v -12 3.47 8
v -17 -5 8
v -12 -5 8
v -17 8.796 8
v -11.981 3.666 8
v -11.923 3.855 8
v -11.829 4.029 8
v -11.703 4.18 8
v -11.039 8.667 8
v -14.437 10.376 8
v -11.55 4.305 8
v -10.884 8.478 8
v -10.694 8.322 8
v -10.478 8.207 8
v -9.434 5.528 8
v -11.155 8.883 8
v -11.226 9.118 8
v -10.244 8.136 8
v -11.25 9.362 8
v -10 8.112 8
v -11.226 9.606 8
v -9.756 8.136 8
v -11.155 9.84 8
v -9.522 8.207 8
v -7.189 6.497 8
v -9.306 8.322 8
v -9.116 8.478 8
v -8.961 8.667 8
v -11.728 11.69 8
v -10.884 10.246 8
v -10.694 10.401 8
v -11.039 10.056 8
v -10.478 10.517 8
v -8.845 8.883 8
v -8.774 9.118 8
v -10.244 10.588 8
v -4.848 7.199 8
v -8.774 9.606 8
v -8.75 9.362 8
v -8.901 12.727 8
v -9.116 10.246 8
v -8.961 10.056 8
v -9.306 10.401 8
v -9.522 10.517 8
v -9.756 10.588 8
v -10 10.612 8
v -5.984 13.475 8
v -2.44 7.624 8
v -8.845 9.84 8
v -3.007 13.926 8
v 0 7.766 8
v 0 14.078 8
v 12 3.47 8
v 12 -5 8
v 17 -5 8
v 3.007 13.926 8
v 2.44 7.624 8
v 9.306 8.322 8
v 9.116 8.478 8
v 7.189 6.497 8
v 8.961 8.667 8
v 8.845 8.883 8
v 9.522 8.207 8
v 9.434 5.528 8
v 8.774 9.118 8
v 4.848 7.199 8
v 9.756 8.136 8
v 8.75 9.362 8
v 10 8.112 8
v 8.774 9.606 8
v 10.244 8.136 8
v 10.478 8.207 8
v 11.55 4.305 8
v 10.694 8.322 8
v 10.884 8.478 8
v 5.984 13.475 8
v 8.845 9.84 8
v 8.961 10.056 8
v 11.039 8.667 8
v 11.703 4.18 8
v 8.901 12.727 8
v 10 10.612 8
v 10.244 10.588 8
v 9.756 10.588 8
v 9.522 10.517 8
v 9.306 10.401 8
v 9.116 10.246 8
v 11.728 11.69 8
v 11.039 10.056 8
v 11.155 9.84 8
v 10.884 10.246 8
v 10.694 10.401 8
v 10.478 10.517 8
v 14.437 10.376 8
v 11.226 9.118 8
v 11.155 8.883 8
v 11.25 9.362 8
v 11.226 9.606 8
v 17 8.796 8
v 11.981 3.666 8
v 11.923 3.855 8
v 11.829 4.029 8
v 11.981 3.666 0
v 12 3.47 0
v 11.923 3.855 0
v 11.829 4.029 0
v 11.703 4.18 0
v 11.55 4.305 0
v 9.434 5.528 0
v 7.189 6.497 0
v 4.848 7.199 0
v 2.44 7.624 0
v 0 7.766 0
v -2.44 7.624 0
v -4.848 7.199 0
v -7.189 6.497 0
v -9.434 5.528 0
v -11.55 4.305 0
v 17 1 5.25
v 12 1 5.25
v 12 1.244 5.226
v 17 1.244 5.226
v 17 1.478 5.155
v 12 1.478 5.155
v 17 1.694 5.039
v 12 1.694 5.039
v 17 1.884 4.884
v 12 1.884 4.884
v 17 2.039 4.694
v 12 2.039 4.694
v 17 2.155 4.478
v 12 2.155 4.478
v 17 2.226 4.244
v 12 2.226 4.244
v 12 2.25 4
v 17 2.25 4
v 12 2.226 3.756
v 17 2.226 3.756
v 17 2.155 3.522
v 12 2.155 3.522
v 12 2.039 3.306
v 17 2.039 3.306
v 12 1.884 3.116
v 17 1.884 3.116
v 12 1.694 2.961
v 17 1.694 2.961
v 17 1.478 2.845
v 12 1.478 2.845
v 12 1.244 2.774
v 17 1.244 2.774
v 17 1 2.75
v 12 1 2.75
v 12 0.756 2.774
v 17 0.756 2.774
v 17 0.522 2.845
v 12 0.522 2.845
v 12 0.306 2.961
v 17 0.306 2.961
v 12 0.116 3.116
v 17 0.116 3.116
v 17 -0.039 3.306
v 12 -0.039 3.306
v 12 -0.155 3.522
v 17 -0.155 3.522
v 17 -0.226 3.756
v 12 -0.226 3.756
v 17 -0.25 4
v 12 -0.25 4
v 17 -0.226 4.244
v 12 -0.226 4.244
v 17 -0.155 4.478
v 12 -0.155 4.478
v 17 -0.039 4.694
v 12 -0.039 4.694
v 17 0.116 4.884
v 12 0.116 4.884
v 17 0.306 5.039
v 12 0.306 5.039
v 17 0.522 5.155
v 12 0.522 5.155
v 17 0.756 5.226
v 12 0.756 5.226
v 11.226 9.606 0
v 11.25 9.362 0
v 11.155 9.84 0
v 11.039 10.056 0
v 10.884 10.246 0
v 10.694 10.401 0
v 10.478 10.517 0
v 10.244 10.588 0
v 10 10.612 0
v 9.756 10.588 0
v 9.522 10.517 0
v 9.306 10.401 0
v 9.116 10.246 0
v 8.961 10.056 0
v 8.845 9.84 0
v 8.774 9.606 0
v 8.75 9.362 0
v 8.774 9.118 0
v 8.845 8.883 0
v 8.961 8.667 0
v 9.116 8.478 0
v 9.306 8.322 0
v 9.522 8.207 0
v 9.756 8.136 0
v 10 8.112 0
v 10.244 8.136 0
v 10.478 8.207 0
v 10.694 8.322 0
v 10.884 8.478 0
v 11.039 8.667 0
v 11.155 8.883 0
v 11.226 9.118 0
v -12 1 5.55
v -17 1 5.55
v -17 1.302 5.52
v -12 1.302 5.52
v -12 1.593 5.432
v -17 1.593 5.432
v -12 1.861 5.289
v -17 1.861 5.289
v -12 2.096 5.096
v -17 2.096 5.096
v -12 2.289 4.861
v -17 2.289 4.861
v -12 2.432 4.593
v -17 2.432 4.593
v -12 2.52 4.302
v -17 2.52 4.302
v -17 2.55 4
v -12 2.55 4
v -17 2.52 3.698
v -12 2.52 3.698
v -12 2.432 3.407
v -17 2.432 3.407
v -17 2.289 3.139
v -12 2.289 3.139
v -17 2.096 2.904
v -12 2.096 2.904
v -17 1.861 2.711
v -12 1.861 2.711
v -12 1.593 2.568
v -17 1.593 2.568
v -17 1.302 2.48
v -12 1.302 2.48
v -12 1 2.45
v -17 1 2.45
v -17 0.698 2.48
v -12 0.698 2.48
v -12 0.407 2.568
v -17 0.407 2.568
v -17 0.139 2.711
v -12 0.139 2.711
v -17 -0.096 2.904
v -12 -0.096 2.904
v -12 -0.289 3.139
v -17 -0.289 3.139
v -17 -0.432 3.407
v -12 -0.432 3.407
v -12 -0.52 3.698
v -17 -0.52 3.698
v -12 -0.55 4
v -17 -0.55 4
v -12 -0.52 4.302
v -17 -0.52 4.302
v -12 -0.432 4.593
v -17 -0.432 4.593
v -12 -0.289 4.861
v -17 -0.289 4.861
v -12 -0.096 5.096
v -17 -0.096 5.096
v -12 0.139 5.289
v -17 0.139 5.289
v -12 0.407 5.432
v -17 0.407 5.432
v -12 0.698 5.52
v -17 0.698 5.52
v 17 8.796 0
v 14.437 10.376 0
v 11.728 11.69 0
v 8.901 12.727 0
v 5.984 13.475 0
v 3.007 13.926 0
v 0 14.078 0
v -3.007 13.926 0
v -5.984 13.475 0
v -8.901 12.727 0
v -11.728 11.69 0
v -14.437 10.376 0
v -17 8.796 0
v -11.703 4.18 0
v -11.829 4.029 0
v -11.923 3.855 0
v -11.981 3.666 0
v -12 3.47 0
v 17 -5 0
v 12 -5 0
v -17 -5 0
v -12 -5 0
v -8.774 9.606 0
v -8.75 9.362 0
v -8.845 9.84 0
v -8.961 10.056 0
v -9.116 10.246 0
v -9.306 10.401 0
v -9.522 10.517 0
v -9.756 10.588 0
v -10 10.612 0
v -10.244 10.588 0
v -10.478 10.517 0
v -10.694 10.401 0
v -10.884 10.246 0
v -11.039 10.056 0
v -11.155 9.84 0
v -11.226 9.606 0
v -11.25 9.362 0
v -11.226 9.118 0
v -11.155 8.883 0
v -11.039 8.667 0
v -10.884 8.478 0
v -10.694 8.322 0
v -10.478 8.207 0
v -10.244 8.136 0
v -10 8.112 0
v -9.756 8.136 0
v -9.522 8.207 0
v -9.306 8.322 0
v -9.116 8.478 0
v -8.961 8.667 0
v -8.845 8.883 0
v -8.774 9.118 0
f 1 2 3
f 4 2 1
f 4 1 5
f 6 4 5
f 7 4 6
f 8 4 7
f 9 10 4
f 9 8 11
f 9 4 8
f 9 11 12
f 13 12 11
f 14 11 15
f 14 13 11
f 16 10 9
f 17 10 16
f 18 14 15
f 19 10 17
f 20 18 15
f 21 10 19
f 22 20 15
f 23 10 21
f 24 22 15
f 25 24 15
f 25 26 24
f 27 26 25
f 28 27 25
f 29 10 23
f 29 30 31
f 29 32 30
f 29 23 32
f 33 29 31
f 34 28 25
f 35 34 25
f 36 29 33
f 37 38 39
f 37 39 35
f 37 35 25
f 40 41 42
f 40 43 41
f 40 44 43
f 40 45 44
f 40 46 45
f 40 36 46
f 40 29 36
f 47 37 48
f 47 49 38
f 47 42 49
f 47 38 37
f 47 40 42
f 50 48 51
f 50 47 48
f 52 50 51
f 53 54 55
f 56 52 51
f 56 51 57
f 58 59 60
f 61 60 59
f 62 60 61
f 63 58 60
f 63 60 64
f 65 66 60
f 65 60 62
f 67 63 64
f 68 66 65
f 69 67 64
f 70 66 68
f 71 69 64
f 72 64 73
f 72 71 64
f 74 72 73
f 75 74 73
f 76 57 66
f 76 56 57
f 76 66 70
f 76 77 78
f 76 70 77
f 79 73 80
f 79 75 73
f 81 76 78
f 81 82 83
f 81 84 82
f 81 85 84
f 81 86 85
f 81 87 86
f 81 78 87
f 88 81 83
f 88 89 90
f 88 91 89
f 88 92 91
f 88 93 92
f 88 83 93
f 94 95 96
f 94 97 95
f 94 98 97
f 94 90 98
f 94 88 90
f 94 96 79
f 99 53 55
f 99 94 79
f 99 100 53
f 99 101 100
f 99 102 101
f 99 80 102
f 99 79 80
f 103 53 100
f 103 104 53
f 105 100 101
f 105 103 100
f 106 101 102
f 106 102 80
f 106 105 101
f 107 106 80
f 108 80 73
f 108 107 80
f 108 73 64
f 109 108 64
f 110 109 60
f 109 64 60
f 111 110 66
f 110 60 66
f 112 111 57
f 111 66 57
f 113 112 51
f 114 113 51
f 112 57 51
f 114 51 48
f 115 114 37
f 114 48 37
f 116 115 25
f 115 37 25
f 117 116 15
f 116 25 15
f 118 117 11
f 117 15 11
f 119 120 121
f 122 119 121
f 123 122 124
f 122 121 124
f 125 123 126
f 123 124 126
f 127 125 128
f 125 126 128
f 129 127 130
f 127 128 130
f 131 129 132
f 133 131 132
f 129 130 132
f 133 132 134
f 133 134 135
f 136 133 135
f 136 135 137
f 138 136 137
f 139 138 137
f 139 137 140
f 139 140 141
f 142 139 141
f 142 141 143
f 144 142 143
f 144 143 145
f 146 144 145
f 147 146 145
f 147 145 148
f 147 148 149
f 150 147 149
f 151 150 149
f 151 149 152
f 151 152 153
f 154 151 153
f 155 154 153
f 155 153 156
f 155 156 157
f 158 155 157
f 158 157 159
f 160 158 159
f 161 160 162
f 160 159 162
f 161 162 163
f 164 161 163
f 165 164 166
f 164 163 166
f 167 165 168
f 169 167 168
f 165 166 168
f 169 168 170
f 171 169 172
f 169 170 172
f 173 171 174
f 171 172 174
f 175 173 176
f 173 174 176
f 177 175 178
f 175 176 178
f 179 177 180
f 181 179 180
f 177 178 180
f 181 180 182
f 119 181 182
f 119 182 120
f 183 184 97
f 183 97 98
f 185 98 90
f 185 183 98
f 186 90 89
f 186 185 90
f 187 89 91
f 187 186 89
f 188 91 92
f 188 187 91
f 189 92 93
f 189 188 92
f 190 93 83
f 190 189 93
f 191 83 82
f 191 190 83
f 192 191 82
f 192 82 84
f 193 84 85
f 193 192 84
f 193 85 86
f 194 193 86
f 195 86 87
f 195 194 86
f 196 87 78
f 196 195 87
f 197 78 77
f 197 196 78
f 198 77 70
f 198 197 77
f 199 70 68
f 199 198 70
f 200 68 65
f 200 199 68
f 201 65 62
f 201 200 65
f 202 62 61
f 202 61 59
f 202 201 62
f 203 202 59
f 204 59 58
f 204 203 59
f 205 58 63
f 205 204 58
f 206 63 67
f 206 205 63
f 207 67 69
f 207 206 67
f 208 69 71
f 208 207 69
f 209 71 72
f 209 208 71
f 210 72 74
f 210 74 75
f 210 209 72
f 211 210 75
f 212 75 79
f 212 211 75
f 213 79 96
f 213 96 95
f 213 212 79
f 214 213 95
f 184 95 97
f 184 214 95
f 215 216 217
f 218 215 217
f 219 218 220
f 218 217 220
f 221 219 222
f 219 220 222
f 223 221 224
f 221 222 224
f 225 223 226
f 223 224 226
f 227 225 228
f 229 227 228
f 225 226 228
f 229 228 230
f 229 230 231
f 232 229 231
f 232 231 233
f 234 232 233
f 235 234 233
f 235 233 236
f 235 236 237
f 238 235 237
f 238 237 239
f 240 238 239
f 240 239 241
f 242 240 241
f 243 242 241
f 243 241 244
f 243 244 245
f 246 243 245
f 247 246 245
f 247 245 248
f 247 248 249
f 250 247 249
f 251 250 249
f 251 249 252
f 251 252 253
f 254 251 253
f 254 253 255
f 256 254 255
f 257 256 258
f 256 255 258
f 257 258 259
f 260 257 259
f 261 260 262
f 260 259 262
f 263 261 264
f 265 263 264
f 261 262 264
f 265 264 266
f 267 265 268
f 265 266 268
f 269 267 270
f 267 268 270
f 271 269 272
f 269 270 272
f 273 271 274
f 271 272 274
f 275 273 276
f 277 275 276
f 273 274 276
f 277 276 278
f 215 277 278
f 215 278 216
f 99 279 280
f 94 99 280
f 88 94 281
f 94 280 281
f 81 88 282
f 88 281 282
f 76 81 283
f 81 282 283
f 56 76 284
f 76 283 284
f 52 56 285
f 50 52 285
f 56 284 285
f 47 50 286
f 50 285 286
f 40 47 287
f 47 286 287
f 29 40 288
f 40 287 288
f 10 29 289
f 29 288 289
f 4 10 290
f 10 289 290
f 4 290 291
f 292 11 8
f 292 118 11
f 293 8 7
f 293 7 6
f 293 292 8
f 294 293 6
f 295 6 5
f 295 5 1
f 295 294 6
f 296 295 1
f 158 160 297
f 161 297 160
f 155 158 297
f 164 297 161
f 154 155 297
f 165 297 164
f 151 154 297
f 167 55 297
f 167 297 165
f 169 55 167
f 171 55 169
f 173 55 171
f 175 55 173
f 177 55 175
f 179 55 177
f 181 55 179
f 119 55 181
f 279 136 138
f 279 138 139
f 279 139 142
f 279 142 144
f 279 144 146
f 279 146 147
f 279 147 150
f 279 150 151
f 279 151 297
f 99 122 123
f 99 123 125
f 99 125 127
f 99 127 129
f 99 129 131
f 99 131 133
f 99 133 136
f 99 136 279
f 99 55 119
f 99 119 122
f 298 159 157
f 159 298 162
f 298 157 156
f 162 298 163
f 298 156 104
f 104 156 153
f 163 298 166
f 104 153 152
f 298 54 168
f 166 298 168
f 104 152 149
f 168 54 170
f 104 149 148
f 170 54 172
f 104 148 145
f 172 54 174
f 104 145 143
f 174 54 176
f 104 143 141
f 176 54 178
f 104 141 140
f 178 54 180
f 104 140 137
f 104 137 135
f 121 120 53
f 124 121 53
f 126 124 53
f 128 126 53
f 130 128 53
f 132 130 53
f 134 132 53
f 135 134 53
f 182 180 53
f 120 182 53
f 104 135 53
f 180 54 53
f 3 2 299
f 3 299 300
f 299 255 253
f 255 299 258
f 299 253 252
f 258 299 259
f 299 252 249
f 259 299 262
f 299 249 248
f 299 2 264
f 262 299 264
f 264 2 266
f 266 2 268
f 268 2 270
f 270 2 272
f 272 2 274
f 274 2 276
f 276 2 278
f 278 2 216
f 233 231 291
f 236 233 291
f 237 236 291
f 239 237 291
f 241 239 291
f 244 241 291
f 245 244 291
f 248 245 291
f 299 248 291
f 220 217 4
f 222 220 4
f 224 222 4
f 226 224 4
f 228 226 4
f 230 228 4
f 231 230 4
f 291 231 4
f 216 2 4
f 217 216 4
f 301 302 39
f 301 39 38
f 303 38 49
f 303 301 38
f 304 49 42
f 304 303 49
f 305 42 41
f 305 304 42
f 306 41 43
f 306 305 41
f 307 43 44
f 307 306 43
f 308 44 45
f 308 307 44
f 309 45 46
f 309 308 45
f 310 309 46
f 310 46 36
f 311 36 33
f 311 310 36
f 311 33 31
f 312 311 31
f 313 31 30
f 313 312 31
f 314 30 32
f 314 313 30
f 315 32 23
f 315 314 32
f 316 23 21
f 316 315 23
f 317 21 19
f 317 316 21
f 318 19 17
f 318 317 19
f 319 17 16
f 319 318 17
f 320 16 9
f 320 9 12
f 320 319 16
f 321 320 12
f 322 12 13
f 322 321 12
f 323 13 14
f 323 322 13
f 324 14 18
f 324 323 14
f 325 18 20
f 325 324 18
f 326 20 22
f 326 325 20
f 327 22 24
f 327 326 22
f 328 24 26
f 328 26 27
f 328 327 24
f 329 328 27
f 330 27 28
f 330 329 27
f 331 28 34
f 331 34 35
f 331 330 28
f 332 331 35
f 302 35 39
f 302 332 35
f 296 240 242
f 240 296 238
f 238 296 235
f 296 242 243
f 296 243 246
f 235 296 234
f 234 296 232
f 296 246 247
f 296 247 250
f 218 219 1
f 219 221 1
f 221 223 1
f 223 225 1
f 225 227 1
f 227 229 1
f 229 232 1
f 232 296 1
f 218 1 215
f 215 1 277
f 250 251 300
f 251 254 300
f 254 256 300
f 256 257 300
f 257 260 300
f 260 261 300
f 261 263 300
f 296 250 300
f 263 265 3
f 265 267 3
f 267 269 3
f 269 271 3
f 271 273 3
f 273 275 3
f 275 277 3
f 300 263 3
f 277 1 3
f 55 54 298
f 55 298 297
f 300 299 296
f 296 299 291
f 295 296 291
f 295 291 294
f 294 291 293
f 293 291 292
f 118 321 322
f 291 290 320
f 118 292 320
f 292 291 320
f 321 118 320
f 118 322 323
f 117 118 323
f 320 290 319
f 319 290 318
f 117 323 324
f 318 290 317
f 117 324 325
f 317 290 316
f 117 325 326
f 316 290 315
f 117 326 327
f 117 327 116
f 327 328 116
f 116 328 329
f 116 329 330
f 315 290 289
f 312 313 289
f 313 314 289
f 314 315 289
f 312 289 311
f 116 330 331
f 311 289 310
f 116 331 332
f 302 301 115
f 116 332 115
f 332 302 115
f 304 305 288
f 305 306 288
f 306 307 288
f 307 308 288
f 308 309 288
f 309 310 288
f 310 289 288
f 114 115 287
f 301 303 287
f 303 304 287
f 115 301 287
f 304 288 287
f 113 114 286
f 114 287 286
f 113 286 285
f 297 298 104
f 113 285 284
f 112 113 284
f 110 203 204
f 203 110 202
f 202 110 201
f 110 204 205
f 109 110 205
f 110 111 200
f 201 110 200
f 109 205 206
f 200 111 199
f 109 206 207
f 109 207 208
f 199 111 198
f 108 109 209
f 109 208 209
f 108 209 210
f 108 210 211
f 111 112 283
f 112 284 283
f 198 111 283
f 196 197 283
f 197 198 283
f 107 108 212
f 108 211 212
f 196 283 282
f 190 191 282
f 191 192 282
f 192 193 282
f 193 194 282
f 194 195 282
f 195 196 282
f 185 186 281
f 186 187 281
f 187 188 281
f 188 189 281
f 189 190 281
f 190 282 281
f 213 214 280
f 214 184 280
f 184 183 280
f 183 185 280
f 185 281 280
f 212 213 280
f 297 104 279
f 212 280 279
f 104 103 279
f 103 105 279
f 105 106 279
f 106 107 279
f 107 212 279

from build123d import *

# Parameters (mm, degrees)
SKETCH_4_R          = 1.25
EXTRUDE_2_DEPTH     = 8
SKETCH_5_W          = 4.5
SKETCH_5_H          = 18.121653049
CUT_EXTRUDE_2_DEPTH = 9
SKETCH_6_R          = 1.25
CUT_EXTRUDE_3_DEPTH = 35
SKETCH_7_R          = 1.55
CUT_EXTRUDE_4_DEPTH = 6
FILLET_1_R          = 1


with BuildPart() as part:
    # 草图4 → 凸台-拉伸2 (new body)
    with BuildSketch(Plane.XY):
        with BuildLine():
            Line((-21.5, 5), (-21.5, -5))
            Line((-21.5, -5), (21.5, -5))
            Line((21.5, -5), (21.5, 5))
            ThreePointArc((21.5, 5), (0, 14.077524047), (-21.5, 5))
        make_face()
        with Locations((-10, 9.361795295)):
            Circle(SKETCH_4_R, mode=Mode.SUBTRACT)
        with Locations((10, 9.361795295)):
            Circle(SKETCH_4_R, mode=Mode.SUBTRACT)
    extrude(amount=EXTRUDE_2_DEPTH)

    # 草图5 → 切除-拉伸2 (cut, through all)
    with BuildSketch(Plane.XY.offset(8)):
        with BuildLine():
            Line((-12, 4), (-12, -5))
            Line((-12, -5), (12, -5))
            Line((12, -5), (12, 4))
            ThreePointArc((12, 4), (0, 7.76631206), (-12, 4))
        make_face()
        with Locations((19.25, 4.060826525)):
            Rectangle(SKETCH_5_W, SKETCH_5_H)
        with Locations((-19.25, 4.060826525)):
            Rectangle(SKETCH_5_W, SKETCH_5_H)
    extrude(amount=-CUT_EXTRUDE_2_DEPTH, mode=Mode.SUBTRACT)

    # 草图6 → 切除-拉伸3 (cut, through all)
    with BuildSketch(Plane.ZY.offset(17)):
        with Locations((4, 1)):
            Circle(SKETCH_6_R)
    extrude(amount=-CUT_EXTRUDE_3_DEPTH, mode=Mode.SUBTRACT)

    # 草图7 → 切除-拉伸4 (cut)
    with BuildSketch(Plane.ZY.offset(17)):
        with Locations((4, 1)):
            Circle(SKETCH_7_R)
    extrude(amount=-CUT_EXTRUDE_4_DEPTH, mode=Mode.SUBTRACT)

    # 圆角1
    fillet_1_edges = [part.edges().sort_by_distance(p)[0] for p in [
        (12, 4, 4),
        (-12, 4, 4),
    ]]
    fillet(fillet_1_edges, radius=FILLET_1_R)


solid = part.part
